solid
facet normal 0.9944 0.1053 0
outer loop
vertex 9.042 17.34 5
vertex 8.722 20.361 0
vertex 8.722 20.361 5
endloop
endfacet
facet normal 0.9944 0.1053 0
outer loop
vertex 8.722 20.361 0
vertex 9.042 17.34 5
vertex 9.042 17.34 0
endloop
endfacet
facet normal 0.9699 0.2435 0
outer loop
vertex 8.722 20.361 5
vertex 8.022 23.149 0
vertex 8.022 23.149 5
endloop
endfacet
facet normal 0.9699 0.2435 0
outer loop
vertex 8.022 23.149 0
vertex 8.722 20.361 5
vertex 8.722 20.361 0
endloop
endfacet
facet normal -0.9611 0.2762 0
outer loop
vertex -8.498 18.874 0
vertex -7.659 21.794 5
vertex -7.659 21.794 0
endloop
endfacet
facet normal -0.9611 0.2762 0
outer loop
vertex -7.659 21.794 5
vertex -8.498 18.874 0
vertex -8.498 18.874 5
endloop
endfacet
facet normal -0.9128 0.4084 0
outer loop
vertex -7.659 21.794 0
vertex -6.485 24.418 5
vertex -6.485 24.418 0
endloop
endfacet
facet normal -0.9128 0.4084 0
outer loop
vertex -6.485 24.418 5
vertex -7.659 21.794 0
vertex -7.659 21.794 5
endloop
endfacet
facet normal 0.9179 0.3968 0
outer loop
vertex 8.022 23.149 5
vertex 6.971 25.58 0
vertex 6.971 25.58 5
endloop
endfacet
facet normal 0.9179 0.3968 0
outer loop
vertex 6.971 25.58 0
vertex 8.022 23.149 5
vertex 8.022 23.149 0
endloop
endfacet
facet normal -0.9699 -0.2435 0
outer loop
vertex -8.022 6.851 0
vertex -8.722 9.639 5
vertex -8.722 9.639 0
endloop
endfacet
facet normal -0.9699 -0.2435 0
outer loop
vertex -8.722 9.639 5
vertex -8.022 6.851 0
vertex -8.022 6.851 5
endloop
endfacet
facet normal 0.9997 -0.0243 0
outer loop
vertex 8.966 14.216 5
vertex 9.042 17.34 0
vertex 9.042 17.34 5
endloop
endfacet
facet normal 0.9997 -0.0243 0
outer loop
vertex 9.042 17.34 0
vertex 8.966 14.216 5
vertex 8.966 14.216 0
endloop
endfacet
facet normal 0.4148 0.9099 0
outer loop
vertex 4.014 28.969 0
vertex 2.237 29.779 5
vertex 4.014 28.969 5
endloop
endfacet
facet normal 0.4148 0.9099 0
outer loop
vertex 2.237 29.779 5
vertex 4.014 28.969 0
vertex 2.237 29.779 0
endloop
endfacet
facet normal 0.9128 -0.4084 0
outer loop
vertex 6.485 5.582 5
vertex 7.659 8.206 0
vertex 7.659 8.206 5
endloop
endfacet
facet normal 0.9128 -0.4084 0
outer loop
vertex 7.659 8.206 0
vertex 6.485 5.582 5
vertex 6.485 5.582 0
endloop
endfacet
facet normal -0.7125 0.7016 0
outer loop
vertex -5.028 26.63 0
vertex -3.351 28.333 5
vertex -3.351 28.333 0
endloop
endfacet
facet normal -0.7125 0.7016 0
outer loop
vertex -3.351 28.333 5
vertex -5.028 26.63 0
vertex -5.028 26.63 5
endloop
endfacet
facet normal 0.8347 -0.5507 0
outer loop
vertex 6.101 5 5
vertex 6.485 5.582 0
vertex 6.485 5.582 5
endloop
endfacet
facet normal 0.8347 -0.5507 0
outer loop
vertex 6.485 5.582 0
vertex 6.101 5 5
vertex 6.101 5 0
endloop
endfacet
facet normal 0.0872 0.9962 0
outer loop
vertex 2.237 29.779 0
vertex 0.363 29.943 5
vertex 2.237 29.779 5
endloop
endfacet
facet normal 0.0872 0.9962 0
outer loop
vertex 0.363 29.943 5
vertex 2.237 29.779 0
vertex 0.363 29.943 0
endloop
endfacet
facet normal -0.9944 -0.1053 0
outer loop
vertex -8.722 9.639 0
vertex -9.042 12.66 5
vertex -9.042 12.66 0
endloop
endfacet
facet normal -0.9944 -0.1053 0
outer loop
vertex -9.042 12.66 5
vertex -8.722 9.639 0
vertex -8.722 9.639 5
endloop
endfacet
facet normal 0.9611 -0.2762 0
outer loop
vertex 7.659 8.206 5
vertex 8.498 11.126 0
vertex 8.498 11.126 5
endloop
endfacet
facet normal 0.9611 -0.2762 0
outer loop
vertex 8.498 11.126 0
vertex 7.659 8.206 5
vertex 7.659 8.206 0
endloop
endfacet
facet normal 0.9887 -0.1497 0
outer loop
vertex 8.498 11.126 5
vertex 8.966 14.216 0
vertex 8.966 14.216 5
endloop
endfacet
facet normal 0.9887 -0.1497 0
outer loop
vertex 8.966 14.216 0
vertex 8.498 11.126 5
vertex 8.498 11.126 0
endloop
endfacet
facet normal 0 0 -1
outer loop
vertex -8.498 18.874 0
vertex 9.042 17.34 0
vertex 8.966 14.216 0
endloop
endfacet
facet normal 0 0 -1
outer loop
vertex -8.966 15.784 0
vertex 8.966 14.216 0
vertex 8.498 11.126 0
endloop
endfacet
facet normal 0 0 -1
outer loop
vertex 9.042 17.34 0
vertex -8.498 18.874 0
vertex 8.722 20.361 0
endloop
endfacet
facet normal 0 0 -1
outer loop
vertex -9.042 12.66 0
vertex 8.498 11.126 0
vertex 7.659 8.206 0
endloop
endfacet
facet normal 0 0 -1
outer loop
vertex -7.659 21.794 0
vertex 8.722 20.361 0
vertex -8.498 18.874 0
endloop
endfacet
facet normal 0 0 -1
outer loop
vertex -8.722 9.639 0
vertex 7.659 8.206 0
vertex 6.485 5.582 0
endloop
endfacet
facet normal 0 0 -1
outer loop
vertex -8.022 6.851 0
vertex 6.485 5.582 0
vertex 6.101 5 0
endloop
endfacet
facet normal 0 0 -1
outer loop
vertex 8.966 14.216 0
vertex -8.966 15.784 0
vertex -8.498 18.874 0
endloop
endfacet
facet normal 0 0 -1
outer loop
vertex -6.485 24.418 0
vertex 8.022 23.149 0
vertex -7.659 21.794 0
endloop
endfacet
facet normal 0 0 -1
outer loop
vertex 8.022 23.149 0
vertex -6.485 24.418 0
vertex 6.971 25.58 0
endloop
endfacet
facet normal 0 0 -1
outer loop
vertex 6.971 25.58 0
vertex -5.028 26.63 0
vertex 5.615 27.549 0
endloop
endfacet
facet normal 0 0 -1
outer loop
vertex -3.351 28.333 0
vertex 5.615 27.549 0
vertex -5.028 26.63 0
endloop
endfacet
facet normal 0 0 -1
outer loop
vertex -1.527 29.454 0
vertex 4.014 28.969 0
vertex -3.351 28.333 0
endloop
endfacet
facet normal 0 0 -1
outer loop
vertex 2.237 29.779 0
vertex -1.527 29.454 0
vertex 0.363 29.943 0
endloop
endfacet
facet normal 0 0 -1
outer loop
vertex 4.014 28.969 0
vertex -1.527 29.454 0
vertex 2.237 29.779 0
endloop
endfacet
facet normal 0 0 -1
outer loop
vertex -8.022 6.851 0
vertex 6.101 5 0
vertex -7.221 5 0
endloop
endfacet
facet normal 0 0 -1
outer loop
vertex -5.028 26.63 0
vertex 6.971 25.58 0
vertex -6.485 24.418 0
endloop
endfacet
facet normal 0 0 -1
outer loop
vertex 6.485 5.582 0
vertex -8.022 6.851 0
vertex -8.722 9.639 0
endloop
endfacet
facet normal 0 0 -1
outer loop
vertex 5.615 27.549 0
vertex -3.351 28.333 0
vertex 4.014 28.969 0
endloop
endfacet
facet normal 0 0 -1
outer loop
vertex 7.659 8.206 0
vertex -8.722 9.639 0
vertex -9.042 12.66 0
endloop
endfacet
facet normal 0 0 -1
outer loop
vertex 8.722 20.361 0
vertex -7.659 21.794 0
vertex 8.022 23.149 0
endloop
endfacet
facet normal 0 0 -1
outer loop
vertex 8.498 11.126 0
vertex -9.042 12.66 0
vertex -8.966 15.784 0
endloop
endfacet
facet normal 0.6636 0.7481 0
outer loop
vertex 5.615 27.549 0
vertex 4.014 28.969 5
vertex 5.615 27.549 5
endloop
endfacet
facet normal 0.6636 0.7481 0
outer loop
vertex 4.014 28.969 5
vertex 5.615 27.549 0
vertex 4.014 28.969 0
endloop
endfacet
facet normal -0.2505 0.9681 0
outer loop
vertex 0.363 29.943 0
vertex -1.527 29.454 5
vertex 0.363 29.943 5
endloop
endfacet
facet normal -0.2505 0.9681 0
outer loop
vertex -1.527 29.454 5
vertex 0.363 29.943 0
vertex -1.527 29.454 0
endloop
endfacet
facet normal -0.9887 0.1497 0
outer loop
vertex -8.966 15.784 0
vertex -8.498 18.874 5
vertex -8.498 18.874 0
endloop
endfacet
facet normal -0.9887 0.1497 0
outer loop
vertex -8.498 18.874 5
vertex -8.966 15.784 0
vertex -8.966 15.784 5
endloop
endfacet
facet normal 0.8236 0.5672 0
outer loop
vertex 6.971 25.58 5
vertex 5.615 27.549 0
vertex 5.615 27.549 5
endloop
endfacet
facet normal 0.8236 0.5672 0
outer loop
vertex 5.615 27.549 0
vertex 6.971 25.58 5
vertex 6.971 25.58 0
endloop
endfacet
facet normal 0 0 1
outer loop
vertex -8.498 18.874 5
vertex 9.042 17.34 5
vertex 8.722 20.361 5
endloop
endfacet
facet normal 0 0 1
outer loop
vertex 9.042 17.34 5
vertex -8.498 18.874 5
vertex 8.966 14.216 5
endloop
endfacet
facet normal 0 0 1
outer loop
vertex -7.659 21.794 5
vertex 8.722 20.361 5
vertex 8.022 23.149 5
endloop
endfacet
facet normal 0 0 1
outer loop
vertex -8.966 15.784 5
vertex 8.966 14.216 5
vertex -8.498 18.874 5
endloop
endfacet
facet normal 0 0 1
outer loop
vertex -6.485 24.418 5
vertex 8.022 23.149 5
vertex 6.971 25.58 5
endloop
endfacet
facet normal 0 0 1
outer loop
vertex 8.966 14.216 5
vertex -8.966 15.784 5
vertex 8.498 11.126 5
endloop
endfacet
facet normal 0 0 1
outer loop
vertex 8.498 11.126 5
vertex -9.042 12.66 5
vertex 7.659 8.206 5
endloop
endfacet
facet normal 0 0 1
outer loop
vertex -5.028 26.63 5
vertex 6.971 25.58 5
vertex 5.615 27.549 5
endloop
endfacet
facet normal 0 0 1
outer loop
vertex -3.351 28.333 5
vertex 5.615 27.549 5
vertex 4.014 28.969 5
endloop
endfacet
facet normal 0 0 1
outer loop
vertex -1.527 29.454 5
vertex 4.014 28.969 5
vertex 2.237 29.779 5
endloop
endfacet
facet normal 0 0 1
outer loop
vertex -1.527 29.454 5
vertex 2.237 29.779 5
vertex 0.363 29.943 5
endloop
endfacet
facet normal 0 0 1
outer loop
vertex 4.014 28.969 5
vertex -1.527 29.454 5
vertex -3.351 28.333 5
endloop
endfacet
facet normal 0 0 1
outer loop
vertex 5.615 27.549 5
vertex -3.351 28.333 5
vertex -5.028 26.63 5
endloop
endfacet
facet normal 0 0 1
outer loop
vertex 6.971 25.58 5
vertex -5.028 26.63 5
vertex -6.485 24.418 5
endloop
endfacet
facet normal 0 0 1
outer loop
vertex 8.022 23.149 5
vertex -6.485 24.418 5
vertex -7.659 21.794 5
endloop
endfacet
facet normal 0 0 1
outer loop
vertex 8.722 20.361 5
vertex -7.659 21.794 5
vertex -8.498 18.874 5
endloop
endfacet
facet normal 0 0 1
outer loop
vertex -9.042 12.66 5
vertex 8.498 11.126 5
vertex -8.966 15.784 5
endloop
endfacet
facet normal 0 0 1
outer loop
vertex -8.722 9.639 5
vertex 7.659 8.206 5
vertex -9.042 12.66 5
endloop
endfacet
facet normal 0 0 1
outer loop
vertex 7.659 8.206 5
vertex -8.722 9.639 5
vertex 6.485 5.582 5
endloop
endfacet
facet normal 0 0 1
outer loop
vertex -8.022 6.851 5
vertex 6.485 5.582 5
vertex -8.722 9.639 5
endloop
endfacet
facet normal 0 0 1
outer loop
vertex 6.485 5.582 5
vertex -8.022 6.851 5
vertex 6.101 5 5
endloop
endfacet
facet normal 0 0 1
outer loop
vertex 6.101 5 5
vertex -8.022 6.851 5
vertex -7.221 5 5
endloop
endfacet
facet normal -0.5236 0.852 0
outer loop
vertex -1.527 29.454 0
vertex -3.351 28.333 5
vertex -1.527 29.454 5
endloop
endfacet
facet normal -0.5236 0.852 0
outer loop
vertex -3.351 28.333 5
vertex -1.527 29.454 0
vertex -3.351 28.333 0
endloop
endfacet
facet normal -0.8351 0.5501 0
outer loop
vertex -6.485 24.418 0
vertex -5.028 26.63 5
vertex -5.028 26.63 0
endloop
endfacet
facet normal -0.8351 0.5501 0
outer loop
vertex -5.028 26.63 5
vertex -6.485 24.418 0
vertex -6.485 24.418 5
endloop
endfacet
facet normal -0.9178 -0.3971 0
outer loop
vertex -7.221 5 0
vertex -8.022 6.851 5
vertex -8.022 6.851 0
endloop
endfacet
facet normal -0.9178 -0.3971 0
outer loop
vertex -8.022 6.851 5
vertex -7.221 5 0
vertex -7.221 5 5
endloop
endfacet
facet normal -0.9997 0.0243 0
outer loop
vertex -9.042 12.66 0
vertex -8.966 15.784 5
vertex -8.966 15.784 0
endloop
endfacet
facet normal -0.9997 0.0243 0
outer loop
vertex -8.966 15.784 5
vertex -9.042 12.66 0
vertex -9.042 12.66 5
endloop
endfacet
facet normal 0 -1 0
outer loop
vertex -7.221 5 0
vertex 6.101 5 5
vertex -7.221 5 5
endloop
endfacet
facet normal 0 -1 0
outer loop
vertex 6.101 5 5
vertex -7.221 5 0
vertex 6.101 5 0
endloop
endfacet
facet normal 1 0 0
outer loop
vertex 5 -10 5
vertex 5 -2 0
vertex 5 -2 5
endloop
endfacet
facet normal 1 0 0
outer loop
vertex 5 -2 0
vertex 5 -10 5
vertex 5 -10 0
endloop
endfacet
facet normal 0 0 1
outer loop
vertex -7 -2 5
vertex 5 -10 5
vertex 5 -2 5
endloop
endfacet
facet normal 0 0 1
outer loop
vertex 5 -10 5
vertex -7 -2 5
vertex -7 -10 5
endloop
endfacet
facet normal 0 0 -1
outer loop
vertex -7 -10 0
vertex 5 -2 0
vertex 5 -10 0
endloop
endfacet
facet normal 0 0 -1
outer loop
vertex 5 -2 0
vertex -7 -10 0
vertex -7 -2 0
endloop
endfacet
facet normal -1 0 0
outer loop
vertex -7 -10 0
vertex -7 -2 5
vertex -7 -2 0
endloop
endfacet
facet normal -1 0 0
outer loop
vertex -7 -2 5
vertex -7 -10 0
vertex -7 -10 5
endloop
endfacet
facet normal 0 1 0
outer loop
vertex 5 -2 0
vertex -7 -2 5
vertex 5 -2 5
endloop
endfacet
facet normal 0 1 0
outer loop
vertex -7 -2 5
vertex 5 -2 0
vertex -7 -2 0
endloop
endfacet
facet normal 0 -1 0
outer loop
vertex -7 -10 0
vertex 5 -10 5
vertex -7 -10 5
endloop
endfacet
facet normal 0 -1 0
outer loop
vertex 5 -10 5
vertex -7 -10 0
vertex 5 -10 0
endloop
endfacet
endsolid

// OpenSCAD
module sole() {
    translate([-7, -10, 0]) cube([12, 8, 5]);

    difference() {
        // Translate to y=15
        translate([0, 15, 0])
            // Rotate a little (5 degrees clockwise around Z); you'll see why in a bit
            rotate([0, 0, -5])
                // Make an ellipse by squashing a 15mm radius circle in the X axis.
                scale([0.6, 1, 1])
                    cylinder(r = 15, h = 5);
        translate([-8, 0, -1]) cube([16, 5, 7]);
    }
}

module footprints() {
    difference() {
        // snow
        color("white")
            translate([-100, 0, -6]) cube([200, 1200, 10]);

        // footprints in the snow
        for(i = [0 : 20]) {
            mirror([i % 2 == 1 ? 1 : 0, 0, 0])
            translate([-10, 60 * i, 0]) sole();
        }
    }
}

sole();

// footprints();
//difference() {
//    cube([20, 20, 5]);
//    cylinder(r = 20, h = 5);
//}
